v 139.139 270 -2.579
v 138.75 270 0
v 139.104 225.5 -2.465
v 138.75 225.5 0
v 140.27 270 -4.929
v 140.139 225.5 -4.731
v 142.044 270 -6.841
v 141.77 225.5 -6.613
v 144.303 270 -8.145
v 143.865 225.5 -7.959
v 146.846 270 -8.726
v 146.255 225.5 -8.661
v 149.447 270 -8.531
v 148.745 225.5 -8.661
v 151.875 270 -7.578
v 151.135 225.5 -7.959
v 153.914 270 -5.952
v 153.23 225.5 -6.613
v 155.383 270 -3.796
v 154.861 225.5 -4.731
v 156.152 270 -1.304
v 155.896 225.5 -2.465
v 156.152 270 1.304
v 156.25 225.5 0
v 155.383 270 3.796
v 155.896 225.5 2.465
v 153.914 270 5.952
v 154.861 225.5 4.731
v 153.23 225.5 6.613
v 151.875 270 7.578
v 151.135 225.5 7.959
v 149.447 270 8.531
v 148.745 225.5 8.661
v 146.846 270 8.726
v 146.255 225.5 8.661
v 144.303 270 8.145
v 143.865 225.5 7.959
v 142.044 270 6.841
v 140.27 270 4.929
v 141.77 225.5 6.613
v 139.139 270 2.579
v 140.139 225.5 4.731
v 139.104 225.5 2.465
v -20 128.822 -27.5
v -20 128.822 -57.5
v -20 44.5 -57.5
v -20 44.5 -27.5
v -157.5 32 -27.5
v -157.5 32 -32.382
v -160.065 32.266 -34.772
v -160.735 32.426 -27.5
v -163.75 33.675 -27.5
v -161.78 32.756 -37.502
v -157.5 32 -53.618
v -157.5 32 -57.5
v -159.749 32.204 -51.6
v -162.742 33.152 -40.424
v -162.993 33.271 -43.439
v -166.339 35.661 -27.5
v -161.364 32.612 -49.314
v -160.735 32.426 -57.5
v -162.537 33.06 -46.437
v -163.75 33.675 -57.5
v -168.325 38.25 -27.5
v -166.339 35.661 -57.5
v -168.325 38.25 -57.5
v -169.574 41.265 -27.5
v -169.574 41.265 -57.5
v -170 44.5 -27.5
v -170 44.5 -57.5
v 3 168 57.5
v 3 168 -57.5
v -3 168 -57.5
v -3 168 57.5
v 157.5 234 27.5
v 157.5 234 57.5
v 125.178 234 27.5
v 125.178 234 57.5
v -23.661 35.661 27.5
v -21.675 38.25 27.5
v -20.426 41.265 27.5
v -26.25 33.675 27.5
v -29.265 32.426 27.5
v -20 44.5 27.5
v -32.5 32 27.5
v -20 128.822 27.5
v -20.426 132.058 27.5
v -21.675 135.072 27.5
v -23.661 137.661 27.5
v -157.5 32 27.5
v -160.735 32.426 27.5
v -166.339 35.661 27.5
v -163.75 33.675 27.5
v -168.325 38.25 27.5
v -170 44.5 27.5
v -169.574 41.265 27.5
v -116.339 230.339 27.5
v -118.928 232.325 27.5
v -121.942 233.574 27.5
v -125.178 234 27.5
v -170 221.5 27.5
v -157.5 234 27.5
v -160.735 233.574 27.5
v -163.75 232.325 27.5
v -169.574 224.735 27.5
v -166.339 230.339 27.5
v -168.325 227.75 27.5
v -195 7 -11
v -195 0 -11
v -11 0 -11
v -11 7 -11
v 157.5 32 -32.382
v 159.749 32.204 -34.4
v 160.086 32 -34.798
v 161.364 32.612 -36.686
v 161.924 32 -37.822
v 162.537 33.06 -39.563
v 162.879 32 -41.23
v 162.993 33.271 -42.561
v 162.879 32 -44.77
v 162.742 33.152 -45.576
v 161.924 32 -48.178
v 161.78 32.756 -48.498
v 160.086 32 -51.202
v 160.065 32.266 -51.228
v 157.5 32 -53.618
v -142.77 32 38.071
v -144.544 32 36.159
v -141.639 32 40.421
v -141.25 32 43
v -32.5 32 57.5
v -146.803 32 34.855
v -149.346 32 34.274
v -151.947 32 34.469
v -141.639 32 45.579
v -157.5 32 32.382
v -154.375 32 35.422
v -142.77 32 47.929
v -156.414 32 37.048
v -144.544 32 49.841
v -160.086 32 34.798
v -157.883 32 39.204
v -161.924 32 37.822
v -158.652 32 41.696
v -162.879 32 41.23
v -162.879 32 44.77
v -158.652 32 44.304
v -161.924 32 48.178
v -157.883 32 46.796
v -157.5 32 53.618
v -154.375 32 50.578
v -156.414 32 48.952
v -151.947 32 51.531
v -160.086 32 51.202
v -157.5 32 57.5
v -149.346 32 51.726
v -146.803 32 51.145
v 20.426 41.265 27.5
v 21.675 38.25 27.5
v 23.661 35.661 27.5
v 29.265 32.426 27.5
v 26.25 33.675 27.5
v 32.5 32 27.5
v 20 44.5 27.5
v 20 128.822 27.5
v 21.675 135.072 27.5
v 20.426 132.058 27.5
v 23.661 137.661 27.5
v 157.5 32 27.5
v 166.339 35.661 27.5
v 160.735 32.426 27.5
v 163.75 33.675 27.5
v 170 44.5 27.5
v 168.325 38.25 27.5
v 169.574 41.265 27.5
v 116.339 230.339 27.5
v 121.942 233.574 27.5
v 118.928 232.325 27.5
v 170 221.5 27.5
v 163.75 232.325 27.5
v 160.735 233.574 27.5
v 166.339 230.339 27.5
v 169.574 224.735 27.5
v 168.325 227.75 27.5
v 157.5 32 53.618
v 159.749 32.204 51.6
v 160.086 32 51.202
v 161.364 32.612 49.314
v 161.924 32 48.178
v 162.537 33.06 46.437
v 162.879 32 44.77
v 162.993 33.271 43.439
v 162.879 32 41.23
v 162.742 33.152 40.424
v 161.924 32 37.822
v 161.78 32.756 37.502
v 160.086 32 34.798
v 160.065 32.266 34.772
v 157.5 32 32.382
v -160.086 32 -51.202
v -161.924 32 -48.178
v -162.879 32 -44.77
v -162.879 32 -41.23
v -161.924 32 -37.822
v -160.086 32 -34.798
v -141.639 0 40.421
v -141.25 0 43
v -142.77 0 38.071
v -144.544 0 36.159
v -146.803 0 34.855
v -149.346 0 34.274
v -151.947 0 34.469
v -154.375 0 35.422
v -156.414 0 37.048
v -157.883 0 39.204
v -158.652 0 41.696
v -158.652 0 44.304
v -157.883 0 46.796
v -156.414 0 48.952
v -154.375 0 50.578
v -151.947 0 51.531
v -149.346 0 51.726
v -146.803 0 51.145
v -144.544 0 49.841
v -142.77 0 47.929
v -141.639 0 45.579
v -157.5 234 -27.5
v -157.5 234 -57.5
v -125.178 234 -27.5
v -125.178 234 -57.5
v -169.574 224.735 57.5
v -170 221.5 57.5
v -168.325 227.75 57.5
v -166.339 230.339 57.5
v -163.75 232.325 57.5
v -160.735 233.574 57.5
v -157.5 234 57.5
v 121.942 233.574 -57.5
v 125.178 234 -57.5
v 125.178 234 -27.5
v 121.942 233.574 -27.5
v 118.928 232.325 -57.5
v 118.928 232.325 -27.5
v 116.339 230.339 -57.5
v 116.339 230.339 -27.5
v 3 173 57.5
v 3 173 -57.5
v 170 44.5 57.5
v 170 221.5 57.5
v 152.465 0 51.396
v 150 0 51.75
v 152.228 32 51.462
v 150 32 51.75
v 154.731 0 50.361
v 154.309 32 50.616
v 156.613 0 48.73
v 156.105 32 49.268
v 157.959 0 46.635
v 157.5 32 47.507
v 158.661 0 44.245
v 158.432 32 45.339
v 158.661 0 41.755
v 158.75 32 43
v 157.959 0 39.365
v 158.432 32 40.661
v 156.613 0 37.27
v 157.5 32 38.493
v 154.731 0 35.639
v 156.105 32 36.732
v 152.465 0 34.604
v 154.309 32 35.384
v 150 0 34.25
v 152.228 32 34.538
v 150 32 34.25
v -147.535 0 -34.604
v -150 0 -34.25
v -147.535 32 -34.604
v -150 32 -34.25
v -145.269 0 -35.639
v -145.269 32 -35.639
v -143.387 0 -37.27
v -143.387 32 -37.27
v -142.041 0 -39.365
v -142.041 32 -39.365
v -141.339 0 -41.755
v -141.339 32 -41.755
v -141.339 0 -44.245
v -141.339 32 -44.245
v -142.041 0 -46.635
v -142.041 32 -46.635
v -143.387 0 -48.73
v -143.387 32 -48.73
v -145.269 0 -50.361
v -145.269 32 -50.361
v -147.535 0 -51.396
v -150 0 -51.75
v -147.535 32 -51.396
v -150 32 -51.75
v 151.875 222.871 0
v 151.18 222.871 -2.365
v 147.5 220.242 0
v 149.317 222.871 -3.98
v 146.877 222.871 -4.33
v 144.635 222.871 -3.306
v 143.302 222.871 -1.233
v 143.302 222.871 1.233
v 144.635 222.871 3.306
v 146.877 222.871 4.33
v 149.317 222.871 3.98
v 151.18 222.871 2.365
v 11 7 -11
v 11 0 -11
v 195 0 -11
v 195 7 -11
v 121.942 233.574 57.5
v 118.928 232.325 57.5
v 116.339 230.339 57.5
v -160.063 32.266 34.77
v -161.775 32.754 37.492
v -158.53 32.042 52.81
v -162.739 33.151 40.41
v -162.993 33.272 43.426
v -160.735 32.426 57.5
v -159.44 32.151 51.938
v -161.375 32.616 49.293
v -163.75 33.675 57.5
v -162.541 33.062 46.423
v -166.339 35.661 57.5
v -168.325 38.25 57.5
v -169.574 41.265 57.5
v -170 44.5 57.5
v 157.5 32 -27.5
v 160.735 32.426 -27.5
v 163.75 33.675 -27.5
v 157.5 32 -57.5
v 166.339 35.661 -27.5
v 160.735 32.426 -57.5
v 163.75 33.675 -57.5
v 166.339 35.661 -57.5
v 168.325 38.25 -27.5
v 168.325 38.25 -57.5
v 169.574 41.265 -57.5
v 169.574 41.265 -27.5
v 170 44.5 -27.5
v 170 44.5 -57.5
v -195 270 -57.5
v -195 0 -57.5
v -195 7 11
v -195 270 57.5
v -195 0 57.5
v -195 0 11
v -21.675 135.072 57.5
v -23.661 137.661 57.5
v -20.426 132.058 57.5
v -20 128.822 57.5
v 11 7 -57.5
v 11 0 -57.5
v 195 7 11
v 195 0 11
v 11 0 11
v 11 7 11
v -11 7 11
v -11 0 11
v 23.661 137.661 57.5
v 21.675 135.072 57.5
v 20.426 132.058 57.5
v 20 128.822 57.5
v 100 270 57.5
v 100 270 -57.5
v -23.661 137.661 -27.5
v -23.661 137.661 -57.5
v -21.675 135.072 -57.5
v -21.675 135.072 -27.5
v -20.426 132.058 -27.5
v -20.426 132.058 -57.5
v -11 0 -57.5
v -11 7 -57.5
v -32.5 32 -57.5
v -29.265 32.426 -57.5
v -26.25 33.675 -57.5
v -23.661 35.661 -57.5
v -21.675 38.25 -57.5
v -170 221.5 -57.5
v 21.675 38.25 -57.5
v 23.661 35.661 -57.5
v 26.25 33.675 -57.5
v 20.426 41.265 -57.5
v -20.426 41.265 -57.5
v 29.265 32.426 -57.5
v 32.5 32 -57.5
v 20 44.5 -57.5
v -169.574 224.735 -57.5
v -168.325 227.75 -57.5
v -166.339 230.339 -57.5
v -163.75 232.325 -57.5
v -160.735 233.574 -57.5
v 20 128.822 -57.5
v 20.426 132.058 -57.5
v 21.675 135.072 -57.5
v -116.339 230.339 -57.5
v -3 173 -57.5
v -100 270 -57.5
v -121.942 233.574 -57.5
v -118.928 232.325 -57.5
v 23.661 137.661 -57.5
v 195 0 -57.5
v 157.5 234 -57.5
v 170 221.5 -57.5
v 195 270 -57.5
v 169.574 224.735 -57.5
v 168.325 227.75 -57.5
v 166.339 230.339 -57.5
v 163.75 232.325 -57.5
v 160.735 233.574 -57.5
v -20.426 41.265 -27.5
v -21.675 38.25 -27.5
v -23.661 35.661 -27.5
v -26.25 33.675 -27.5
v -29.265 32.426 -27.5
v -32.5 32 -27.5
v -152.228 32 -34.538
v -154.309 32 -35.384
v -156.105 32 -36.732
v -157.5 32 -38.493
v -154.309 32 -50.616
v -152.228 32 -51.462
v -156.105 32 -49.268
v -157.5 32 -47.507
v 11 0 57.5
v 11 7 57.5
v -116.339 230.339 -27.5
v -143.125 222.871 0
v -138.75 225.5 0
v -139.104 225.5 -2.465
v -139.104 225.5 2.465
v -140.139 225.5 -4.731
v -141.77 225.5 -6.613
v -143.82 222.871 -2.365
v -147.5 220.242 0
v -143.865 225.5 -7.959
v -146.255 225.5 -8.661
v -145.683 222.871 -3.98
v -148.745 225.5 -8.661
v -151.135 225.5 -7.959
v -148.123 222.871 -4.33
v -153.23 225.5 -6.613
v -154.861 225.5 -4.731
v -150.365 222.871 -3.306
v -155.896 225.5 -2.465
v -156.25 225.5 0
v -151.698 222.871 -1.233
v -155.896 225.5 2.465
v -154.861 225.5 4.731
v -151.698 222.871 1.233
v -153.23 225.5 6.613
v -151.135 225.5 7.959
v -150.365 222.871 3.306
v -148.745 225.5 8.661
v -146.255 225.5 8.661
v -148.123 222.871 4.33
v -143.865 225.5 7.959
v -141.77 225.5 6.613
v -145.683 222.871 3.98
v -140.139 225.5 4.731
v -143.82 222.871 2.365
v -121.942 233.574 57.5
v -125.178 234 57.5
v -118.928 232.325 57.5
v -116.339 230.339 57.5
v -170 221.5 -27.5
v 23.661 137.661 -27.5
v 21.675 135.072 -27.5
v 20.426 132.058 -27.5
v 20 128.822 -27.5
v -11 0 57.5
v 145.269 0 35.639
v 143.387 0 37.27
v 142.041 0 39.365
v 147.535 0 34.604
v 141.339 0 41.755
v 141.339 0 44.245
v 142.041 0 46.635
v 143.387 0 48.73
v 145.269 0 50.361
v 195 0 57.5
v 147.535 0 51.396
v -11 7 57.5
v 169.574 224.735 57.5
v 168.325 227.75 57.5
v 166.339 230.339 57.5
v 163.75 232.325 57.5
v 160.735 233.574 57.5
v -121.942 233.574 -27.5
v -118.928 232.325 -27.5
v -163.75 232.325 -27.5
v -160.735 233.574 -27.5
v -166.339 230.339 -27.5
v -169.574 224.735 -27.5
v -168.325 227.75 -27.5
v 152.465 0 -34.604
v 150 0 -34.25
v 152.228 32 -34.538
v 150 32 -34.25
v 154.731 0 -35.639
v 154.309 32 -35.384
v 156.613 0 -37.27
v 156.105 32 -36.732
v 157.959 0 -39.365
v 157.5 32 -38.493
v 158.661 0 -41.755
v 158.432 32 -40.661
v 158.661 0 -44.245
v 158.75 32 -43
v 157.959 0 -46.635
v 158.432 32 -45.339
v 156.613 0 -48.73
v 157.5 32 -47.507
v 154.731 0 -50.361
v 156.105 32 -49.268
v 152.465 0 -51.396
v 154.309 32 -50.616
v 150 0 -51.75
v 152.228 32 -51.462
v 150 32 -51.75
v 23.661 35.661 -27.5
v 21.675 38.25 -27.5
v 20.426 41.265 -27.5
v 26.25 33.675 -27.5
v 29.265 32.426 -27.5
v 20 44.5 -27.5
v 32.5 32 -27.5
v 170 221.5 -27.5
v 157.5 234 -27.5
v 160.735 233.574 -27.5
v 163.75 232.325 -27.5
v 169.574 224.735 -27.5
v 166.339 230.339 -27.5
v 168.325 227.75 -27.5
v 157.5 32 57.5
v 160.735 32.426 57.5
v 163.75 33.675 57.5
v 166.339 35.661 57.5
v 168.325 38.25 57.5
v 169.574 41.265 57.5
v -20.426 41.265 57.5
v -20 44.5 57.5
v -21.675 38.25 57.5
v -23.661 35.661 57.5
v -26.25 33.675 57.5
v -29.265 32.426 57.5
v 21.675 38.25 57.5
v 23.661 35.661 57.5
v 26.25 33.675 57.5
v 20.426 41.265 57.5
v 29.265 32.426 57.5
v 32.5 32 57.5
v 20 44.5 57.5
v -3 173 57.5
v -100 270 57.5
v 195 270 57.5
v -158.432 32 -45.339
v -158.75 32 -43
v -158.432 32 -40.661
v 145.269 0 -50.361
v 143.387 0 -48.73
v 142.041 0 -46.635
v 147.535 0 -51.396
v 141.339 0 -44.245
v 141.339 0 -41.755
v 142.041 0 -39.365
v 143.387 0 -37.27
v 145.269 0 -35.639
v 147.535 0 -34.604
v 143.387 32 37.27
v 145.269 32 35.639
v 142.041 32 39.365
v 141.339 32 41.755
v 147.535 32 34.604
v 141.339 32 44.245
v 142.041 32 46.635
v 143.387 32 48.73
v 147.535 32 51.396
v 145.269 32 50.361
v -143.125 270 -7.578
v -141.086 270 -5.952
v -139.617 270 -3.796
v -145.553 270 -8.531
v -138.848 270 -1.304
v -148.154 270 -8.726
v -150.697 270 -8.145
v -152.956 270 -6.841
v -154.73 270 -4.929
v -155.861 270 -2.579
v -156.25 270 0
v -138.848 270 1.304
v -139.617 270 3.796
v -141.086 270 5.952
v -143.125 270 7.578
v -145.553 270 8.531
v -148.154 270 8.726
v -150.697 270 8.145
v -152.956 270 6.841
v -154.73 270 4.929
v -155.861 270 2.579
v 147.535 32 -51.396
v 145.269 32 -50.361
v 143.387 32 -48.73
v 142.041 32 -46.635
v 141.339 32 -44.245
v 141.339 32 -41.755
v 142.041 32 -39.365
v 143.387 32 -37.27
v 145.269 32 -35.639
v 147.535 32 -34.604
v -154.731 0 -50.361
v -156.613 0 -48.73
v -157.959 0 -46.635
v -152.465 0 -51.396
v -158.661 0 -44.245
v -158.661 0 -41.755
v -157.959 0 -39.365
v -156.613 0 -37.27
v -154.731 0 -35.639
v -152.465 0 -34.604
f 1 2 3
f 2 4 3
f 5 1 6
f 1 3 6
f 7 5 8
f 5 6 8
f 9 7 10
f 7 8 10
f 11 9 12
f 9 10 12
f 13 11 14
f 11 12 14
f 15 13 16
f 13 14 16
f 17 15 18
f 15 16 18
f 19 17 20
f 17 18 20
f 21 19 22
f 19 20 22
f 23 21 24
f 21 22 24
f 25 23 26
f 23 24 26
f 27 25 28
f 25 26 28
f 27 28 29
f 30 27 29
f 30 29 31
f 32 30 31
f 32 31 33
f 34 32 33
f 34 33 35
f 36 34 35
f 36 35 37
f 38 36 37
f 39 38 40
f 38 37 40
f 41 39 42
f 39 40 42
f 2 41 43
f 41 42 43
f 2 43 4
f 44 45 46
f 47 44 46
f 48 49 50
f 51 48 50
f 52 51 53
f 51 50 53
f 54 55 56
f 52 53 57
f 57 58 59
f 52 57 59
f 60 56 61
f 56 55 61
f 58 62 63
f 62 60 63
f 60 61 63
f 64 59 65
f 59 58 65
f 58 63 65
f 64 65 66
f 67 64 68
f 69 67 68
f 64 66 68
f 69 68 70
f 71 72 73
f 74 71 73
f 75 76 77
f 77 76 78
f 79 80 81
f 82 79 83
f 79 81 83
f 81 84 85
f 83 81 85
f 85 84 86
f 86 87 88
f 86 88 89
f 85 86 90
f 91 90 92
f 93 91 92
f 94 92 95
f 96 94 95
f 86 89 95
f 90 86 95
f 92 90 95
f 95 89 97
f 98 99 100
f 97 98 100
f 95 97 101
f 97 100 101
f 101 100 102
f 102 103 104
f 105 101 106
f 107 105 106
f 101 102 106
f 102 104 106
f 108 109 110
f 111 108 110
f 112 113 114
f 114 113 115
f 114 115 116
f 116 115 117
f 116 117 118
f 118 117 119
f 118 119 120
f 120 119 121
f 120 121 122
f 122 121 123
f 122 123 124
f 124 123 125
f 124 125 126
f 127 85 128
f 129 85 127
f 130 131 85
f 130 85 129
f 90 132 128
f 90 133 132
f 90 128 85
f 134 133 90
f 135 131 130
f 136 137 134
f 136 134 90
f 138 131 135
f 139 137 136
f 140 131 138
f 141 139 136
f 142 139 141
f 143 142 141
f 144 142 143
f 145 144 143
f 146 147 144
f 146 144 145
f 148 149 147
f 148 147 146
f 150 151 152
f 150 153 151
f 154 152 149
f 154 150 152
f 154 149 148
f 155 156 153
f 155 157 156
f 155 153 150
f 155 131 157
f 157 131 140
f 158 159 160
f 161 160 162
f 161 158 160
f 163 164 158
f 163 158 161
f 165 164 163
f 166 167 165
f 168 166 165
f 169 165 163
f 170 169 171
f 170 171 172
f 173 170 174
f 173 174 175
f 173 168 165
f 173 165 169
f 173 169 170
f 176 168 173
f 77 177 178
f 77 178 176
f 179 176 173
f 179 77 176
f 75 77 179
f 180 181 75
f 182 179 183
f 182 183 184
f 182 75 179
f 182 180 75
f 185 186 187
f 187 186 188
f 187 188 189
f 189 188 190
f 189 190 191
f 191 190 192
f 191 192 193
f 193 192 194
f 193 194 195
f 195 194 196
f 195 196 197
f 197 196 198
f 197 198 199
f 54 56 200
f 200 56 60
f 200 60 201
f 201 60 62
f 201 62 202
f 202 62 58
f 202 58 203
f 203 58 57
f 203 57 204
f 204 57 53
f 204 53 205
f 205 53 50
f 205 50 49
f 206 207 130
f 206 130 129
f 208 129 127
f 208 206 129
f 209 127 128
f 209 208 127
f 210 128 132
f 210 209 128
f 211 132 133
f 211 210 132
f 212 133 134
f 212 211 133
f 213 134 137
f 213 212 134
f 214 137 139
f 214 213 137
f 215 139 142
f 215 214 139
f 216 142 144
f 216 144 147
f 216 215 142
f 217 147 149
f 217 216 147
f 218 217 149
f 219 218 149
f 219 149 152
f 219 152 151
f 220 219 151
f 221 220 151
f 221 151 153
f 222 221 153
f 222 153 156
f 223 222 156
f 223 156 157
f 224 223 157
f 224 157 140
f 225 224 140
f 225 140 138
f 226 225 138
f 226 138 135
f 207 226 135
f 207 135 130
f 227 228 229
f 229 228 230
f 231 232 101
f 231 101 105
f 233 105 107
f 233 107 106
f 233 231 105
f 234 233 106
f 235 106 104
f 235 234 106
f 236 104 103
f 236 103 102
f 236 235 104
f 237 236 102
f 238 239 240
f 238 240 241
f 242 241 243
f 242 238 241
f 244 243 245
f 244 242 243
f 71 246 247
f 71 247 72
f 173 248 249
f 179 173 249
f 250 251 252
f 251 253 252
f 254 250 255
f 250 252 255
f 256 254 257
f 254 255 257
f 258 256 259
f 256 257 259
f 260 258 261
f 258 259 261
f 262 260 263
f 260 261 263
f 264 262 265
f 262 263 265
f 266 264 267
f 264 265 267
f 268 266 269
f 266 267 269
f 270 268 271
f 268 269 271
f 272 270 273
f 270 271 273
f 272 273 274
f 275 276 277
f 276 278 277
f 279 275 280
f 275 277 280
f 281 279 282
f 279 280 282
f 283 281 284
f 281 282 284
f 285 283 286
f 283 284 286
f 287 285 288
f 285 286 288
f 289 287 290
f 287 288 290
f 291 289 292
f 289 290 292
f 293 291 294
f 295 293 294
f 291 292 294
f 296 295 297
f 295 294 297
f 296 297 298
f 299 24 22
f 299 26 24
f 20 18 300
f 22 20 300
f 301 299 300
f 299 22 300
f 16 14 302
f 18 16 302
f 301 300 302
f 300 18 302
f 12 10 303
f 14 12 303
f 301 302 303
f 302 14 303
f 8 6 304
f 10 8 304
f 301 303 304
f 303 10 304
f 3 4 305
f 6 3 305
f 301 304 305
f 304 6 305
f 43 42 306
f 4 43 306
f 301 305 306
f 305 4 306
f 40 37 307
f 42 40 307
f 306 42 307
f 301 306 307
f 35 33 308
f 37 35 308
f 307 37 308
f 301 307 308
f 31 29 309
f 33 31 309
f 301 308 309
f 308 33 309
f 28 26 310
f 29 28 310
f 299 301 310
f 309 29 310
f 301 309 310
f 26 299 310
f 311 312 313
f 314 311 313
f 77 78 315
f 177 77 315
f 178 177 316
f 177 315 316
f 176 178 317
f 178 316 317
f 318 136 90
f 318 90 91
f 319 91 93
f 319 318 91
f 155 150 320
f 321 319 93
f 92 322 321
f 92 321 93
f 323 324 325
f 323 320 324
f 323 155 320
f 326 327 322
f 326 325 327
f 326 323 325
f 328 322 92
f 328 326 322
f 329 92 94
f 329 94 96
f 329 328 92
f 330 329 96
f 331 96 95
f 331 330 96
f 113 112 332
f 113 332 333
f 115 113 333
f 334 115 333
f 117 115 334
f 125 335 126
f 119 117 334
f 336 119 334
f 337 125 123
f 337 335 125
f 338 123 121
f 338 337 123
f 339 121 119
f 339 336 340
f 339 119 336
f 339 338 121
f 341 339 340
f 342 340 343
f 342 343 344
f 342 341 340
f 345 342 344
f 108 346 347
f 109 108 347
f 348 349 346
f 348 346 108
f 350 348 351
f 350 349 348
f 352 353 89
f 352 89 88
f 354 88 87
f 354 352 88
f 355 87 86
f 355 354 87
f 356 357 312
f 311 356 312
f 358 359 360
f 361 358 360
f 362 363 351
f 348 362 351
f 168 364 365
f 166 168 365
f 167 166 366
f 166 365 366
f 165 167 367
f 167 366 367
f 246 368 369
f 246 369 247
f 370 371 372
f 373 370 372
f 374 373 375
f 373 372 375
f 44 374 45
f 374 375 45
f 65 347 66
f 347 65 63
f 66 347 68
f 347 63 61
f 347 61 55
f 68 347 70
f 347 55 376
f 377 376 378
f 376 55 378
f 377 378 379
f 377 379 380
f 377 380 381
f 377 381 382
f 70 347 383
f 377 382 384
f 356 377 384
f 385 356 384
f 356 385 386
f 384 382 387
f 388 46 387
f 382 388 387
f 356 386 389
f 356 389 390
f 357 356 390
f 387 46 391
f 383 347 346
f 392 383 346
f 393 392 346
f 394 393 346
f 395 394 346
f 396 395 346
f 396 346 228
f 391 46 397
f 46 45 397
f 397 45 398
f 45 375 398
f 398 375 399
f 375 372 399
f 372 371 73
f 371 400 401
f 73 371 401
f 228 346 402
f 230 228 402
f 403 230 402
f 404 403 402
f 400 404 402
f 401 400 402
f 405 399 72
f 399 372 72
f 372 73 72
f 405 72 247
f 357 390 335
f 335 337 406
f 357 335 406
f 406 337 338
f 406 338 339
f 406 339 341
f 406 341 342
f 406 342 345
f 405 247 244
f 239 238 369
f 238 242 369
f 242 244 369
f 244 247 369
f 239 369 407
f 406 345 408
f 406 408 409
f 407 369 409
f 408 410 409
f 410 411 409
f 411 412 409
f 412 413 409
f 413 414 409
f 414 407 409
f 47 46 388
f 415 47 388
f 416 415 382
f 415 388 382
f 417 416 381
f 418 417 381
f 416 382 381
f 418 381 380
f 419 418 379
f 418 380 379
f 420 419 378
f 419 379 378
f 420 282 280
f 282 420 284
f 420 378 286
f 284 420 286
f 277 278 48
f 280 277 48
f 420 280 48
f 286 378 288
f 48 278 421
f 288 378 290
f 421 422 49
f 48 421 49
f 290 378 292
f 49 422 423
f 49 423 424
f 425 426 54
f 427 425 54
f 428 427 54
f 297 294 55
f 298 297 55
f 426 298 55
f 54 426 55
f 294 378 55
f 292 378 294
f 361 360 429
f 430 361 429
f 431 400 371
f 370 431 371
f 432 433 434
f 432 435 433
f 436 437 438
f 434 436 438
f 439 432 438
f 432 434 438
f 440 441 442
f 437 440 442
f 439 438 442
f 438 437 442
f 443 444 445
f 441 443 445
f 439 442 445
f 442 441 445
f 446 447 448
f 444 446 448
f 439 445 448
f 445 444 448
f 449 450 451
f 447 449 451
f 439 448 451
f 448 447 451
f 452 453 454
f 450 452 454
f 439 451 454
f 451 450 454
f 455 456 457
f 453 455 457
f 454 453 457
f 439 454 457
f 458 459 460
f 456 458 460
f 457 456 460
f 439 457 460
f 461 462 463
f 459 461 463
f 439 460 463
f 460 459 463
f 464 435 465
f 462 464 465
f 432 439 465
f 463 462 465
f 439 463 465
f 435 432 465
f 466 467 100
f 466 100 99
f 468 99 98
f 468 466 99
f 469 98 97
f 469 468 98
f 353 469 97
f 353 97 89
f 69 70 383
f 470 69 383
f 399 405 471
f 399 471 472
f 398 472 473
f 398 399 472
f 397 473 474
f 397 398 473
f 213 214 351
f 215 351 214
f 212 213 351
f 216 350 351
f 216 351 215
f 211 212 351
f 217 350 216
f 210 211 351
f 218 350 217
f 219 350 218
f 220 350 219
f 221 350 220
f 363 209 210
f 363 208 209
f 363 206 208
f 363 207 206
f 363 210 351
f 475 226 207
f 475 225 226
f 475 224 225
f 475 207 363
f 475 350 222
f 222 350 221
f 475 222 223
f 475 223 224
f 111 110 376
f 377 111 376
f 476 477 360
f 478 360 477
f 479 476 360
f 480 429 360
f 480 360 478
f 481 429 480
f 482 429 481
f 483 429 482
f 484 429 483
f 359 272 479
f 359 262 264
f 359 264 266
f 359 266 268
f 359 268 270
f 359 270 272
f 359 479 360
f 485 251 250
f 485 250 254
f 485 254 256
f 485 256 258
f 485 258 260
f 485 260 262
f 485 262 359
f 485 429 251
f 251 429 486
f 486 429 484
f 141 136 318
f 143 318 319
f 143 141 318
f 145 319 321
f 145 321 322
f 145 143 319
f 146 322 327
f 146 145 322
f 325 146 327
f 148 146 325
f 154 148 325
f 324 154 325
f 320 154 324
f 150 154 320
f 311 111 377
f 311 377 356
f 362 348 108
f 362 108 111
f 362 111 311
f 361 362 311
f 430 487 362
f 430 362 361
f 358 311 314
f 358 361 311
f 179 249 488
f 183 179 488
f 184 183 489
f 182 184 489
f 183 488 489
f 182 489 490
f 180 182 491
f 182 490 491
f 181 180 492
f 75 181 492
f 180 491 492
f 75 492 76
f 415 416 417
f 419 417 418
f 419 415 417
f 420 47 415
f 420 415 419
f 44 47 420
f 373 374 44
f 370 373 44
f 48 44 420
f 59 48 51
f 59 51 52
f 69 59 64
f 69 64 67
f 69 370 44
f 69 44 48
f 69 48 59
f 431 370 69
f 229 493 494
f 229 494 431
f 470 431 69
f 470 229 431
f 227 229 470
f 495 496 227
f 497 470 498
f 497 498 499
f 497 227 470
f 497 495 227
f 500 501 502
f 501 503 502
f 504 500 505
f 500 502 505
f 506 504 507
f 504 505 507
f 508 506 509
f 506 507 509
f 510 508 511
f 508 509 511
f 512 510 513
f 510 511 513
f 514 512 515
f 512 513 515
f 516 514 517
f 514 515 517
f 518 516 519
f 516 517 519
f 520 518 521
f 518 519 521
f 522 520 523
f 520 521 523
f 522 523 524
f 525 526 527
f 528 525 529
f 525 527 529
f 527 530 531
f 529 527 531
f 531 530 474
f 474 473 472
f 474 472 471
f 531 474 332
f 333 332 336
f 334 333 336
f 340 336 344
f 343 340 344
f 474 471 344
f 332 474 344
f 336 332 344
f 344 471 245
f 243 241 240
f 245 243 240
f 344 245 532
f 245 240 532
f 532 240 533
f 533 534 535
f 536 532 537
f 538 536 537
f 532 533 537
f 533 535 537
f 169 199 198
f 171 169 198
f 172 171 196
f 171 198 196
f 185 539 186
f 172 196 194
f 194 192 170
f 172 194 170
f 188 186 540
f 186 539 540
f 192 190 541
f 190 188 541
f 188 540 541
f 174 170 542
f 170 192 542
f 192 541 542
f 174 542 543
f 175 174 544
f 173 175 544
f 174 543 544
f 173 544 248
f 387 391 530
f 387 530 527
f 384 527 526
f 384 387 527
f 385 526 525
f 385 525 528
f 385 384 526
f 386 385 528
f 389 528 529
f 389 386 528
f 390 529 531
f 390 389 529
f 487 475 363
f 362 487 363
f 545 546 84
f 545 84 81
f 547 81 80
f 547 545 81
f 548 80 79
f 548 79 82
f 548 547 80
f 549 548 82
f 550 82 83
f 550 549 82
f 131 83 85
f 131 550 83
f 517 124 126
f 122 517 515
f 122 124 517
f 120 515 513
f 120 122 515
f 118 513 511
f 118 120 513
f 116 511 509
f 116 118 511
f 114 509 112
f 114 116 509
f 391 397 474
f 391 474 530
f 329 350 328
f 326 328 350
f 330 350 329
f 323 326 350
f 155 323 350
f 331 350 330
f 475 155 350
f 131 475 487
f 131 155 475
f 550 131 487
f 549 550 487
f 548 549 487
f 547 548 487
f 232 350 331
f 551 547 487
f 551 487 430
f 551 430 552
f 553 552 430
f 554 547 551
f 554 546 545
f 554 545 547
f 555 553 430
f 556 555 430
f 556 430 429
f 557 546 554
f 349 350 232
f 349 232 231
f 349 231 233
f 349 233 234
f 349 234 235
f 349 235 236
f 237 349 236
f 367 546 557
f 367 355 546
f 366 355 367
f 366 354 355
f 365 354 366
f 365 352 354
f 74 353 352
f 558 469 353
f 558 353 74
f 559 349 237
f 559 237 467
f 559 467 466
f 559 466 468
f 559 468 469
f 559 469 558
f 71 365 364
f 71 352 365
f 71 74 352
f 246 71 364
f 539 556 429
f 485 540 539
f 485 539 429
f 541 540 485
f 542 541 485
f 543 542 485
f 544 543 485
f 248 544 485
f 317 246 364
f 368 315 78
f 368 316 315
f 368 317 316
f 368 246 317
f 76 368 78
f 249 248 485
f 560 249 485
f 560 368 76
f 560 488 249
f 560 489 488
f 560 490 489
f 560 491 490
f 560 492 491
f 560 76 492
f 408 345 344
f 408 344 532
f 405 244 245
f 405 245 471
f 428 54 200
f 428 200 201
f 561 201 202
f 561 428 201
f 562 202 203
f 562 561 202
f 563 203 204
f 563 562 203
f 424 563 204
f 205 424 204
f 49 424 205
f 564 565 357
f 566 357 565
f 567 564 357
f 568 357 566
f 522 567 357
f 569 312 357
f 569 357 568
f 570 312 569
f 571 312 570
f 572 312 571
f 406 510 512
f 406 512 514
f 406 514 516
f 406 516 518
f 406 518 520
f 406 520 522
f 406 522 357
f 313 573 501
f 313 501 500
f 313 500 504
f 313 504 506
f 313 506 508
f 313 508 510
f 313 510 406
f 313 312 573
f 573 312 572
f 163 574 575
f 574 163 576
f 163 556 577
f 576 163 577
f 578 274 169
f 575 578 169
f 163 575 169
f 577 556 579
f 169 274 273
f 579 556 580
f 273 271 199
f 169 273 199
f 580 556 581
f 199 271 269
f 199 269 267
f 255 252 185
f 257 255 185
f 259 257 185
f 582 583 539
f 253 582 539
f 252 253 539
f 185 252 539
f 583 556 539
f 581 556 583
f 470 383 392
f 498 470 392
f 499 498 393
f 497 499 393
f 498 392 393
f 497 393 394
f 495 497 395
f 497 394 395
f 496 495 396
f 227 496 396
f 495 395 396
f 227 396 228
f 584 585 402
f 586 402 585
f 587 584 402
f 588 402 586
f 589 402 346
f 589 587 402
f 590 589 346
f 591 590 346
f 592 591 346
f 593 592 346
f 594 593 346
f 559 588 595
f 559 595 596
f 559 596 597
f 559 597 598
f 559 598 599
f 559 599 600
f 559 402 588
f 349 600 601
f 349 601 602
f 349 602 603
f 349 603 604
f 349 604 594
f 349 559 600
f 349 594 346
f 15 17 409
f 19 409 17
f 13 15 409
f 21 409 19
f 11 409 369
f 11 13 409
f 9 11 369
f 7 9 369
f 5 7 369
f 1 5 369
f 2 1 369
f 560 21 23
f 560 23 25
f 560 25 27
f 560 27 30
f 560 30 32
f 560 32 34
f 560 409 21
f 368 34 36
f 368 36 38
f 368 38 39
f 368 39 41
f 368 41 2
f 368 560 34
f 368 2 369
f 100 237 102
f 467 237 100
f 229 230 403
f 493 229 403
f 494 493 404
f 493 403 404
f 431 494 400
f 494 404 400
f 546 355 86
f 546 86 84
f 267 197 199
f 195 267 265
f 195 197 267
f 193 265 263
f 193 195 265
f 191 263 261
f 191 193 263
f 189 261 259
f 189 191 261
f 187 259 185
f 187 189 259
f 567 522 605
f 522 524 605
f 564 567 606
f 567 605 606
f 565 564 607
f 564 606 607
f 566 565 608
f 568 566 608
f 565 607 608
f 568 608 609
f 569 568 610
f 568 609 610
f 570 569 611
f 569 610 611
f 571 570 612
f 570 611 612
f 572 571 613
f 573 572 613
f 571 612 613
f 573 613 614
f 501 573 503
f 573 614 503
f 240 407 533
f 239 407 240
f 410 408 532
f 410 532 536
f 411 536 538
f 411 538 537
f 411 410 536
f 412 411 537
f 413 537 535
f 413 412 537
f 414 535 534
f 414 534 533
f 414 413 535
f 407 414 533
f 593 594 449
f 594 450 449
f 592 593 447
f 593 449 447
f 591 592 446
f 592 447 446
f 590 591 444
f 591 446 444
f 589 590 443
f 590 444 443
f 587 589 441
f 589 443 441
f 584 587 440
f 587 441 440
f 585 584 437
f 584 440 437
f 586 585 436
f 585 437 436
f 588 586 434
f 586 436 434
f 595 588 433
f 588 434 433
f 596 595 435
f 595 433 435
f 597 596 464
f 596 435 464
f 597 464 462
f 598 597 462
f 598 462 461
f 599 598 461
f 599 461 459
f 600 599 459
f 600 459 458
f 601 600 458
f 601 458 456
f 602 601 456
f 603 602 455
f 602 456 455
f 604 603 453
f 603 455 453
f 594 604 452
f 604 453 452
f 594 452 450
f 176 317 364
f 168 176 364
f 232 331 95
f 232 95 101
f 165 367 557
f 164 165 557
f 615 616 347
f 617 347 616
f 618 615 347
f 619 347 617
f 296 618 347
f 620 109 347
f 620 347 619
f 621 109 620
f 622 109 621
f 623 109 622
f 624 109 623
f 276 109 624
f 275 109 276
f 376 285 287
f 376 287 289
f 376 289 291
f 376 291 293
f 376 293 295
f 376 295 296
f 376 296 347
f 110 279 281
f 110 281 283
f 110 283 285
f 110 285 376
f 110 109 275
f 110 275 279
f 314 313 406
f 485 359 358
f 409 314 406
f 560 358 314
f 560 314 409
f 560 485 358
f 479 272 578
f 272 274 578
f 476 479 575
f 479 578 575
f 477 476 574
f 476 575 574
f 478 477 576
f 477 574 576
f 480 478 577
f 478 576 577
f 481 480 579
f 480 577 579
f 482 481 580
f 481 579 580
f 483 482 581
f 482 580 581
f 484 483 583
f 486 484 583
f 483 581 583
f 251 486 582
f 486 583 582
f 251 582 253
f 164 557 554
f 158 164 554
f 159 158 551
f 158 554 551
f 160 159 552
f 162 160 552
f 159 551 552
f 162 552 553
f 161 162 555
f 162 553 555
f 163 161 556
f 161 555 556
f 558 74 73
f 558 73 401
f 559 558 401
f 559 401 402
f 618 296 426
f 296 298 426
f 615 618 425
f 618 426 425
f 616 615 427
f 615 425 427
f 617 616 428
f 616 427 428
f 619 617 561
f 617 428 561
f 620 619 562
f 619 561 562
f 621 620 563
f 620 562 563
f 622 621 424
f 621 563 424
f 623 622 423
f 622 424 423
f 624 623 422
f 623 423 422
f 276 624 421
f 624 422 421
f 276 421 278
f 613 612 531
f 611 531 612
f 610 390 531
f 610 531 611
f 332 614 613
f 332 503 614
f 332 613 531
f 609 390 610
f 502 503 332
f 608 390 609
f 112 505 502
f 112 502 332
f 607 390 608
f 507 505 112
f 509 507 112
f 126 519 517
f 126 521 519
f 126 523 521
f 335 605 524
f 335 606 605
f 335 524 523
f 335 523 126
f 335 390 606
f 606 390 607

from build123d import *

# Parameters (mm, degrees)
BOSS_EXTRUDE1_DEPTH                            = 57.5
CUT_EXTRUDE1_DEPTH                             = 30
M20_TAPPED_HOLE1_D                             = 17.5
M20_TAPPED_HOLE1_DEPTH                         = 44.5
M20_TAPPED_HOLE1_TIP                           = 5.257530416491153
MIRROR2_COPY_1_DEPTH                           = 30
CUT_EXTRUDE2_DEPTH                             = 7
CUT_EXTRUDE3_DEPTH                             = 7
CBORE_START                                    = -1
CBORE_FOR_M16_HEX_SOCKET_HEAD_CAP_SC_2_R       = 8.75
CBORE_FOR_M16_HEX_SOCKET_HEAD_CAP_SCREW1_DEPTH = 34.275018433
CBORE_START_2                                  = 32
CBORE_FOR_M16_HEX_SOCKET_HEAD_CAP_SC_3_O_R     = 8.75
CBORE_FOR_M16_HEX_SOCKET_HEAD_CAP_SC_3_DEPTH   = 12.5


with BuildPart() as part:
    # Sketch1 → Boss-Extrude1 (new, symmetric)
    with BuildSketch(Plane.XY):
        Polygon((-195, 0), (195, 0), (195.00000000000003, 270), (99.9999999999997, 270.00000000000006), (2.999999999999999, 173.00000000000009), (2.999999999999999, 168.0000000000001), (-2.999999999999999, 168.0000000000001), (-2.999999999999999, 173.00000000000009), (-99.9999999999997, 270.00000000000006), (-195.00000000000003, 270), align=None)
    extrude(amount=BOSS_EXTRUDE1_DEPTH, both=True)

    # Sketch2 → Cut-Extrude1 (cut)
    with BuildSketch(Plane.XY.offset(57.5)):
        with BuildLine():
            Line((32.500000000000014, 32), (157.5, 32))
            ThreePointArc((157.5, 32), (166.33883476483186, 35.661165235168156), (170, 44.5))
            Line((170, 44.5), (170, 221.49999999999997))
            ThreePointArc((170, 221.49999999999997), (166.33883476483186, 230.3388347648318), (157.5, 234))
            Line((157.5, 234), (125.17766952966375, 233.99999999999997))
            ThreePointArc((125.17766952966375, 233.99999999999997), (120.39412662510011, 233.04849415639106), (116.3388347648319, 230.3388347648318))
            Line((116.3388347648319, 230.3388347648318), (23.661165235168177, 137.66116523516763))
            ThreePointArc((23.661165235168177, 137.66116523516763), (20.95150584360897, 133.60587337489943), (20.000000000000004, 128.82233047033586))
            Line((20.000000000000004, 128.82233047033586), (20.000000000000014, 44.5))
            ThreePointArc((20.000000000000014, 44.5), (23.66116523516817, 35.661165235168156), (32.500000000000014, 32))
        make_face()
    cut_extrude1 = extrude(amount=-CUT_EXTRUDE1_DEPTH, mode=Mode.SUBTRACT)

    # M20 Tapped Hole1
    with Locations(Plane(origin=(-1.5777e-13, 270.0000000000001, 0), x_dir=(1, 0, 0), z_dir=(0, 1, 0))):
        with Locations((-147.5, 0), (147.5, 0)):
            Hole(M20_TAPPED_HOLE1_D / 2, depth=M20_TAPPED_HOLE1_DEPTH)
            with Locations((0, 0, -(M20_TAPPED_HOLE1_DEPTH + M20_TAPPED_HOLE1_TIP / 2))):  # 118° drill point
                Cone(0, M20_TAPPED_HOLE1_D / 2, M20_TAPPED_HOLE1_TIP, mode=Mode.SUBTRACT)

    # Mirror1: Cut-Extrude1 across plane
    add(cut_extrude1.mirror(Plane(origin=(0, 0, 0), x_dir=(0, 0, 1), z_dir=(1, 0, 0))), mode=Mode.SUBTRACT)

    # Mirror2: Cut-Extrude1 across plane
    add(cut_extrude1.mirror(Plane.XY), mode=Mode.SUBTRACT)

    # Mirror2 copy 1 sketch → Mirror2 copy 1 (cut)
    with BuildSketch(Plane(origin=(0, 0, -57.5), x_dir=(-1, 0, 0), z_dir=(0, 0, -1))):
        with BuildLine():
            Line((32.500000000000014, 32), (157.5, 32))
            ThreePointArc((157.5, 32), (166.33883476483186, 35.661165235168156), (170, 44.5))
            Line((170, 44.5), (170, 221.49999999999997))
            ThreePointArc((170, 221.49999999999997), (166.33883476483186, 230.3388347648318), (157.5, 234))
            Line((157.5, 234), (125.17766952966375, 233.99999999999997))
            ThreePointArc((125.17766952966375, 233.99999999999997), (120.39412662510011, 233.04849415639106), (116.3388347648319, 230.3388347648318))
            Line((116.3388347648319, 230.3388347648318), (23.661165235168177, 137.66116523516763))
            ThreePointArc((23.661165235168177, 137.66116523516763), (20.95150584360897, 133.60587337489943), (20.000000000000004, 128.82233047033586))
            Line((20.000000000000004, 128.82233047033586), (20.000000000000014, 44.5))
            ThreePointArc((20.000000000000014, 44.5), (23.66116523516817, 35.661165235168156), (32.500000000000014, 32))
        make_face()
    extrude(amount=-MIRROR2_COPY_1_DEPTH, mode=Mode.SUBTRACT)

    # Sketch5 → Cut-Extrude2 (cut)
    with BuildSketch(Plane.XZ):
        Polygon((-11.00000000000001, -57.5), (11.00000000000001, -57.5), (11, 57.5), (-11, 57.5), align=None)
    extrude(amount=-CUT_EXTRUDE2_DEPTH, mode=Mode.SUBTRACT)

    # Sketch6 → Cut-Extrude3 (cut)
    with BuildSketch(Plane.XZ):
        Polygon((-195, -11.000000000000004), (195, -11), (195, 11), (-195, 11.000000000000004), align=None)
    extrude(amount=-CUT_EXTRUDE3_DEPTH, mode=Mode.SUBTRACT)

    # CBORE for M16 Hex Socket Head Cap Screw1: read off the stored shape, not the designer's step
    # CBORE for M16 Hex Socket Head Cap Sc 2 → CBORE for M16 Hex Socket Head Cap Screw1 (cut)
    with BuildSketch(Plane(origin=(0, 0, 0), x_dir=(1, 0, 0), z_dir=(0, 1, 0)).offset(CBORE_START)):
        with Locations((-150, -43)):
            Circle(CBORE_FOR_M16_HEX_SOCKET_HEAD_CAP_SC_2_R)
    extrude(amount=CBORE_FOR_M16_HEX_SOCKET_HEAD_CAP_SCREW1_DEPTH, mode=Mode.SUBTRACT)

    # CBORE for M16 Hex Socket Head Cap Sc 3 o → CBORE for M16 Hex Socket Head Cap Sc 3 (cut)
    with BuildSketch(Plane(origin=(0, 0, 0), x_dir=(1, 0, 0), z_dir=(0, 1, 0)).offset(CBORE_START_2)):
        with BuildLine():
            Line((-155.543924868, -31), (-157.5, -32.381619709))
            ThreePointArc((-157.5, -32.381619709), (-163, -43), (-157.5, -53.618380291))
            Line((-157.5, -53.618380291), (-155.543924868, -55))
            Line((-155.543924868, -55), (-140, -55))
            Line((-140, -55), (-140, -31))
            Line((-140, -31), (-155.543924868, -31))
        make_face()
        with Locations((-150, -43)):
            Circle(CBORE_FOR_M16_HEX_SOCKET_HEAD_CAP_SC_3_O_R, mode=Mode.SUBTRACT)
    extrude(amount=CBORE_FOR_M16_HEX_SOCKET_HEAD_CAP_SC_3_DEPTH, mode=Mode.SUBTRACT)

    # LPattern1: read off the stored shape, not the designer's step
    # LPattern1: loft between two sections, ruled curve by curve
    lpattern1_from = [
        Edge.make_three_point_arc((-157.5, 31.999999688, -53.618380291), (-163, 31.999999688, -43), (-157.5, 31.999999688, -32.381619709)),
        Edge.make_line((-157.5, 31.999999688, -32.381619709), (-157.5, 31.999999688, -53.618380291)),
    ]
    lpattern1_to = [
        Edge.make_three_point_arc((-157.5, 33.2753422, -53.618380291), (-163, 33.2753422, -43), (-157.5, 33.2753422, -32.381619709)),
        Edge.make_line((-157.5, 33.2753422, -32.381619709), (-157.5, 33.2753422, -53.618380291)),
    ]
    lpattern1 = Solid(Shell([*[Face.make_surface_from_curves(lpattern1_from[k], lpattern1_to[k]) for k in range(2)], Face(Wire(lpattern1_from)), Face(Wire(lpattern1_to))]))
    add(lpattern1, mode=Mode.SUBTRACT)

    # LPattern1 2: loft between two sections, ruled curve by curve
    lpattern1_2_from = [
        Edge.make_three_point_arc((-150, 0, -34.25), (-141.25, 0, -43), (-150, 0, -51.75)),
        Edge.make_three_point_arc((-150, 0, -51.75), (-158.75, 0, -43), (-150, 0, -34.25)),
    ]
    lpattern1_2_to = [
        Edge.make_three_point_arc((-150, 32, -34.25), (-141.25, 32, -43), (-150, 32, -51.75)),
        Edge.make_three_point_arc((-150, 32, -51.75), (-158.75, 32, -43), (-150, 32, -34.25)),
    ]
    lpattern1_2 = Solid(Shell([*[Face.make_surface_from_curves(lpattern1_2_from[k], lpattern1_2_to[k]) for k in range(2)], Face(Wire(lpattern1_2_from)), Face(Wire(lpattern1_2_to))]))
    add(lpattern1_2, mode=Mode.SUBTRACT)

    # LPattern1 3: loft between two sections, ruled curve by curve
    lpattern1_3_from = [
        Edge.make_three_point_arc((157.5, 31.999999688, 53.618380291), (163, 31.999999688, 43), (157.5, 31.999999688, 32.381619709)),
        Edge.make_line((157.5, 31.999999688, 32.381619709), (157.5, 31.999999688, 53.618380291)),
    ]
    lpattern1_3_to = [
        Edge.make_three_point_arc((157.5, 33.2753422, 53.618380291), (163, 33.2753422, 43), (157.5, 33.2753422, 32.381619709)),
        Edge.make_line((157.5, 33.2753422, 32.381619709), (157.5, 33.2753422, 53.618380291)),
    ]
    lpattern1_3 = Solid(Shell([*[Face.make_surface_from_curves(lpattern1_3_from[k], lpattern1_3_to[k]) for k in range(2)], Face(Wire(lpattern1_3_from)), Face(Wire(lpattern1_3_to))]))
    add(lpattern1_3, mode=Mode.SUBTRACT)

    # LPattern1 4: loft between two sections, ruled curve by curve
    lpattern1_4_from = [
        Edge.make_three_point_arc((150, 0, 51.75), (158.75, 0, 43), (150, 0, 34.25)),
        Edge.make_three_point_arc((150, 0, 34.25), (141.25, 0, 43), (150, 0, 51.75)),
    ]
    lpattern1_4_to = [
        Edge.make_three_point_arc((150, 32, 51.75), (158.75, 32, 43), (150, 32, 34.25)),
        Edge.make_three_point_arc((150, 32, 34.25), (141.25, 32, 43), (150, 32, 51.75)),
    ]
    lpattern1_4 = Solid(Shell([*[Face.make_surface_from_curves(lpattern1_4_from[k], lpattern1_4_to[k]) for k in range(2)], Face(Wire(lpattern1_4_from)), Face(Wire(lpattern1_4_to))]))
    add(lpattern1_4, mode=Mode.SUBTRACT)

    # LPattern1 5: loft between two sections, ruled curve by curve
    lpattern1_5_from = [
        Edge.make_three_point_arc((150, 0, -34.25), (158.75, 0, -43), (150, 0, -51.75)),
        Edge.make_three_point_arc((150, 0, -51.75), (141.25, 0, -43), (150, 0, -34.25)),
    ]
    lpattern1_5_to = [
        Edge.make_three_point_arc((150, 32, -34.25), (158.75, 32, -43), (150, 32, -51.75)),
        Edge.make_three_point_arc((150, 32, -51.75), (141.25, 32, -43), (150, 32, -34.25)),
    ]
    lpattern1_5 = Solid(Shell([*[Face.make_surface_from_curves(lpattern1_5_from[k], lpattern1_5_to[k]) for k in range(2)], Face(Wire(lpattern1_5_from)), Face(Wire(lpattern1_5_to))]))
    add(lpattern1_5, mode=Mode.SUBTRACT)

    # LPattern1 6: loft between two sections, ruled curve by curve
    lpattern1_6_from = [
        Edge.make_three_point_arc((157.5, 31.999999688, -32.381619709), (163, 31.999999688, -43), (157.5, 31.999999688, -53.618380291)),
        Edge.make_line((157.5, 31.999999688, -53.618380291), (157.5, 31.999999688, -32.381619709)),
    ]
    lpattern1_6_to = [
        Edge.make_three_point_arc((157.5, 33.2753422, -32.381619709), (163, 33.2753422, -43), (157.5, 33.2753422, -53.618380291)),
        Edge.make_line((157.5, 33.2753422, -53.618380291), (157.5, 33.2753422, -32.381619709)),
    ]
    lpattern1_6 = Solid(Shell([*[Face.make_surface_from_curves(lpattern1_6_from[k], lpattern1_6_to[k]) for k in range(2)], Face(Wire(lpattern1_6_from)), Face(Wire(lpattern1_6_to))]))
    add(lpattern1_6, mode=Mode.SUBTRACT)


solid = part.part
